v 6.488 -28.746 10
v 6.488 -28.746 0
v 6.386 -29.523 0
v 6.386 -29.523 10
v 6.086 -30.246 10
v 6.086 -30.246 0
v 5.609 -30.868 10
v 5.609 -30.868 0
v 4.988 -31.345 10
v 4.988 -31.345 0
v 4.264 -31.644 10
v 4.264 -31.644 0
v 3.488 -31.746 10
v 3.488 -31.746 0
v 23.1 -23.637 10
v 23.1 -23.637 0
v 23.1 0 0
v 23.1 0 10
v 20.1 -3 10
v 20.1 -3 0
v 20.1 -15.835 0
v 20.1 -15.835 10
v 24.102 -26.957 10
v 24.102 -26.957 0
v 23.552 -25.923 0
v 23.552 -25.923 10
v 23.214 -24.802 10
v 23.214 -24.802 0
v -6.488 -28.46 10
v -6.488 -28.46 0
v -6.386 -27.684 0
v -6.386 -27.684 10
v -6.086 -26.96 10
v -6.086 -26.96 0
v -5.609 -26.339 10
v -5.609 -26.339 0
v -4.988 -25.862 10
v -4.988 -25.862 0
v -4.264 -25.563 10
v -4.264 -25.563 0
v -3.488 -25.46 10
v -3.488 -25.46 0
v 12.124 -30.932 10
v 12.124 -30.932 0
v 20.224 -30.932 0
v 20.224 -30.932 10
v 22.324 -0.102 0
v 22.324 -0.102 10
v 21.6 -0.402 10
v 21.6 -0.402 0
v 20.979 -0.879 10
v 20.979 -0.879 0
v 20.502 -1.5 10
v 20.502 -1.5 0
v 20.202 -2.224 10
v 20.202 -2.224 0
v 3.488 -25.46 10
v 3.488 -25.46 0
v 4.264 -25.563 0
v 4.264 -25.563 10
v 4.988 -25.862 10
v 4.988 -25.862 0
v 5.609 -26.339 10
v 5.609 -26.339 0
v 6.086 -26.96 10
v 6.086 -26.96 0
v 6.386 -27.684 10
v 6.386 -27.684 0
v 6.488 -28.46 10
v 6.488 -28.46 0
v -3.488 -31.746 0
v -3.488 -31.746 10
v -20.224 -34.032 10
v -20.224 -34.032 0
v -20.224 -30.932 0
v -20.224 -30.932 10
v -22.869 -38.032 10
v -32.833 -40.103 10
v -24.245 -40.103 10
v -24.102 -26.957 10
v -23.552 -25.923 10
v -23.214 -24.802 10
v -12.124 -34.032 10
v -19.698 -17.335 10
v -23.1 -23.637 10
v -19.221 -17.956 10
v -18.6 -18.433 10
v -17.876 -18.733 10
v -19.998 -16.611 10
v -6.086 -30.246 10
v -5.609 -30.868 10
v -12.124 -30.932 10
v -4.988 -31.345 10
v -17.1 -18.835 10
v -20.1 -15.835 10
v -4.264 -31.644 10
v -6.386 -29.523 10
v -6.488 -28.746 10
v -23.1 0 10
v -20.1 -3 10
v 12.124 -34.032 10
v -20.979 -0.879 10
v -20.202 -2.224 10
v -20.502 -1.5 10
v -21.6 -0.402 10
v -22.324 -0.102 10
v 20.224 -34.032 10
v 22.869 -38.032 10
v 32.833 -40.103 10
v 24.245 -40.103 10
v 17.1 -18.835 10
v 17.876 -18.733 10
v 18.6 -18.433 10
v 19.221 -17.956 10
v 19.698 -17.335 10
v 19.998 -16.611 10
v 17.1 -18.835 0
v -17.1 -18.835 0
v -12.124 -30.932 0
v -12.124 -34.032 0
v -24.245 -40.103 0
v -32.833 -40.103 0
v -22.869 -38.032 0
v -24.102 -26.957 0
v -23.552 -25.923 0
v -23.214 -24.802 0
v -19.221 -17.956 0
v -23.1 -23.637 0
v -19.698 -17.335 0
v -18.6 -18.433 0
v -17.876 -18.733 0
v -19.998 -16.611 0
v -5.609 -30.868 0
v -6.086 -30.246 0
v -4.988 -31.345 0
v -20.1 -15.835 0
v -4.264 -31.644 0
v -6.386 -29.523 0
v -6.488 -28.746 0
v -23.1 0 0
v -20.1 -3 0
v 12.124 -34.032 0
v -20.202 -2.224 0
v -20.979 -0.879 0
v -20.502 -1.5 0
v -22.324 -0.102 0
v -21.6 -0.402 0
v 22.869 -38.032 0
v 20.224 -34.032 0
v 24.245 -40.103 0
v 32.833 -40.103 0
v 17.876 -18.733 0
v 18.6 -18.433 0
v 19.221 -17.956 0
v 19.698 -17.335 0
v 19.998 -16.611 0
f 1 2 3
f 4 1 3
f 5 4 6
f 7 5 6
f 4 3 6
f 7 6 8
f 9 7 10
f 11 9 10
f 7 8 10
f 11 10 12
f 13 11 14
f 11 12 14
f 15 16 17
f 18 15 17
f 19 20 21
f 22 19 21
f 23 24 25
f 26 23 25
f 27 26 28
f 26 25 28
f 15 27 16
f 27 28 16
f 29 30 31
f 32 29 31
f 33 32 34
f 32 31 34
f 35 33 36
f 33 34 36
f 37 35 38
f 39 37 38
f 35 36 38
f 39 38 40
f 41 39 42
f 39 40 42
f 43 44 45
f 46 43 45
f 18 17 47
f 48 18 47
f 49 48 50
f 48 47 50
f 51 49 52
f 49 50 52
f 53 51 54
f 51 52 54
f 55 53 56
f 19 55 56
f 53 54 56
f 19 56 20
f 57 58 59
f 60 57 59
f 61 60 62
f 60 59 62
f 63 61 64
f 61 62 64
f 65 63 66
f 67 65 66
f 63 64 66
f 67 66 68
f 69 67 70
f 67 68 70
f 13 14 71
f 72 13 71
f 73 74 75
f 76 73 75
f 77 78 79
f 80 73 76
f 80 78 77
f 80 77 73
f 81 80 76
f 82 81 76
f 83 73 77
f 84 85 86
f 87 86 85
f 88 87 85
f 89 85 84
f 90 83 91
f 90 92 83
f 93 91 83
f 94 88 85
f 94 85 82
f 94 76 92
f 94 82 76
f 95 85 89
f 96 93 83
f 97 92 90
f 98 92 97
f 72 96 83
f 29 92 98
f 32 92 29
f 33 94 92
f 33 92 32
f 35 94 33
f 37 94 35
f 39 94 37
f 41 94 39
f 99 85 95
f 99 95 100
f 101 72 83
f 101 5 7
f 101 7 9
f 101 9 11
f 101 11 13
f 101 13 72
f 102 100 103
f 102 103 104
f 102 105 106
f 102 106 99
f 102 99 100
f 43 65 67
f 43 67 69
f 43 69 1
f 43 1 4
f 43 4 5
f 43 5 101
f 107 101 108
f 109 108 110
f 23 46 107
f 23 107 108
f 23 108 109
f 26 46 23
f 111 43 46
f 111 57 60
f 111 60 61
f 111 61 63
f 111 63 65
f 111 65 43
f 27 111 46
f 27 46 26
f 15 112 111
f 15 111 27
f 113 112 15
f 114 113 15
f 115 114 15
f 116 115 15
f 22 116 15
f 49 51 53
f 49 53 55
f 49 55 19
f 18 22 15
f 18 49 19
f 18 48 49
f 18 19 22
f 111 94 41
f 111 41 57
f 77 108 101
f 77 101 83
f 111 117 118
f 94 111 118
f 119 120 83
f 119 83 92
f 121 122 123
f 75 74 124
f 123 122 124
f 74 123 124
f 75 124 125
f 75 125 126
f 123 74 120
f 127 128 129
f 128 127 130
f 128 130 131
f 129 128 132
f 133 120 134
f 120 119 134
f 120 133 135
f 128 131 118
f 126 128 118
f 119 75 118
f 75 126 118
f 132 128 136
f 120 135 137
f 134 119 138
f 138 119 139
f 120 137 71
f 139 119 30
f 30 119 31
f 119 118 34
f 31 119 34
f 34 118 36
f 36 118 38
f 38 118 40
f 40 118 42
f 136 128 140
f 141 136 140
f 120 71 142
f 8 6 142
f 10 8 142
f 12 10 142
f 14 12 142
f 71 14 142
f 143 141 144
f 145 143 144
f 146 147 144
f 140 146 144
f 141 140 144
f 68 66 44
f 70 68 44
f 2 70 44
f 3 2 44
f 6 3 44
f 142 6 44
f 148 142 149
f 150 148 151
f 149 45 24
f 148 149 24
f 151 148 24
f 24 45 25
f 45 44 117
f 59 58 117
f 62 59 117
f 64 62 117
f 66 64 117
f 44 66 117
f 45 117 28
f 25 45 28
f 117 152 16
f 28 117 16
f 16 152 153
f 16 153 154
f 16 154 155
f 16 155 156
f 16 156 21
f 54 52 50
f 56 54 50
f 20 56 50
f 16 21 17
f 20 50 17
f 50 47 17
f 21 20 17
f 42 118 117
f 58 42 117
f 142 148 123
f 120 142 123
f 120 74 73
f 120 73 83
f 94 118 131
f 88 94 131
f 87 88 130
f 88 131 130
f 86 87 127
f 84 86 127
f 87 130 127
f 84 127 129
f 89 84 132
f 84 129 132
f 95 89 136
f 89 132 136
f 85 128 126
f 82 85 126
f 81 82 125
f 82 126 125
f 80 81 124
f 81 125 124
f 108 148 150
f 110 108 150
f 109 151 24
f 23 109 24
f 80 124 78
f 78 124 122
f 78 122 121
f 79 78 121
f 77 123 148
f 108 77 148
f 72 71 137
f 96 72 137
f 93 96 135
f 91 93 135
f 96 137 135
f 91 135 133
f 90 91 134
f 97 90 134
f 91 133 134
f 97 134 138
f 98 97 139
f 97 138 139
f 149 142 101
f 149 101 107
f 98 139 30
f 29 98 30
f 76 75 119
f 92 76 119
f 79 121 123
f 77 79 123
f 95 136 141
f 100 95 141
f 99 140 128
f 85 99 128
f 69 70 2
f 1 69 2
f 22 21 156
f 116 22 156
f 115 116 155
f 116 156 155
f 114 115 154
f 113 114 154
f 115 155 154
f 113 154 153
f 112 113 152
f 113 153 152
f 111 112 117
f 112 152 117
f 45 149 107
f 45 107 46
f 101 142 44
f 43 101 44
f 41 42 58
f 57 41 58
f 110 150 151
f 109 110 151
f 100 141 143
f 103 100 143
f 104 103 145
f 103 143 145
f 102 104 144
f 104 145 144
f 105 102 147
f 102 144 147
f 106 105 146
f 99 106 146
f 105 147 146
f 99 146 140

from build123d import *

# Parameters (mm, degrees)
F0_W     = 8.1
F0_H     = 3.1
F1_DEPTH = 10


with BuildPart() as f1:
    # F0 (on Top) → F1 (new body)
    with BuildSketch(Plane.XY):
        with BuildLine():
            ThreePointArc((20.1, -15.834965), (19.22132, -17.956285), (17.1, -18.834965))
            Line((17.1, -18.834965), (-17.1, -18.834965))
            ThreePointArc((-17.1, -18.834965), (-19.22132, -17.956285), (-20.1, -15.834965))
            Line((-20.1, -15.834965), (-20.1, -3))
            ThreePointArc((-20.1, -3), (-20.97868, -0.87868), (-23.1, 0))
            Line((-23.1, 0), (-23.1, -23.637105))
            ThreePointArc((-23.1, -23.637105), (-23.355919, -25.370754), (-24.101846, -26.956511))
            Line((-24.101846, -26.956511), (-32.833091, -40.10347))
            Line((-32.833091, -40.10347), (-24.244918, -40.10347))
            Line((-24.244918, -40.10347), (-22.869062, -38.031792))
            Line((-22.869062, -38.031792), (0, -38.031792))
            Line((0, -38.031792), (22.869062, -38.031792))
            Line((22.869062, -38.031792), (24.244918, -40.10347))
            Line((24.244918, -40.10347), (32.833091, -40.10347))
            Line((32.833091, -40.10347), (24.101846, -26.956511))
            ThreePointArc((24.101846, -26.956511), (23.355919, -25.370754), (23.1, -23.637105))
            Line((23.1, -23.637105), (23.1, 0))
            ThreePointArc((23.1, 0), (20.97868, -0.87868), (20.1, -3))
            Line((20.1, -3), (20.1, -15.834965))
        make_face()
        with Locations((-16.173929, -32.481792)):
            Rectangle(F0_W, F0_H, mode=Mode.SUBTRACT)
        with Locations((16.173929, -32.481792)):
            Rectangle(F0_W, F0_H, mode=Mode.SUBTRACT)
        with BuildLine():
            ThreePointArc((-6.487891, -28.46048), (-5.609211, -26.339159), (-3.487891, -25.46048))
            Line((-3.487891, -25.46048), (3.487891, -25.46048))
            ThreePointArc((3.487891, -25.46048), (5.609211, -26.339159), (6.487891, -28.46048))
            Line((6.487891, -28.46048), (6.487891, -28.74646))
            ThreePointArc((6.487891, -28.74646), (5.609211, -30.86778), (3.487891, -31.74646))
            Line((3.487891, -31.74646), (-3.487891, -31.74646))
            ThreePointArc((-3.487891, -31.74646), (-5.609211, -30.86778), (-6.487891, -28.74646))
            Line((-6.487891, -28.74646), (-6.487891, -28.46048))
        make_face(mode=Mode.SUBTRACT)
    extrude(amount=F1_DEPTH)


solid = f1.part
